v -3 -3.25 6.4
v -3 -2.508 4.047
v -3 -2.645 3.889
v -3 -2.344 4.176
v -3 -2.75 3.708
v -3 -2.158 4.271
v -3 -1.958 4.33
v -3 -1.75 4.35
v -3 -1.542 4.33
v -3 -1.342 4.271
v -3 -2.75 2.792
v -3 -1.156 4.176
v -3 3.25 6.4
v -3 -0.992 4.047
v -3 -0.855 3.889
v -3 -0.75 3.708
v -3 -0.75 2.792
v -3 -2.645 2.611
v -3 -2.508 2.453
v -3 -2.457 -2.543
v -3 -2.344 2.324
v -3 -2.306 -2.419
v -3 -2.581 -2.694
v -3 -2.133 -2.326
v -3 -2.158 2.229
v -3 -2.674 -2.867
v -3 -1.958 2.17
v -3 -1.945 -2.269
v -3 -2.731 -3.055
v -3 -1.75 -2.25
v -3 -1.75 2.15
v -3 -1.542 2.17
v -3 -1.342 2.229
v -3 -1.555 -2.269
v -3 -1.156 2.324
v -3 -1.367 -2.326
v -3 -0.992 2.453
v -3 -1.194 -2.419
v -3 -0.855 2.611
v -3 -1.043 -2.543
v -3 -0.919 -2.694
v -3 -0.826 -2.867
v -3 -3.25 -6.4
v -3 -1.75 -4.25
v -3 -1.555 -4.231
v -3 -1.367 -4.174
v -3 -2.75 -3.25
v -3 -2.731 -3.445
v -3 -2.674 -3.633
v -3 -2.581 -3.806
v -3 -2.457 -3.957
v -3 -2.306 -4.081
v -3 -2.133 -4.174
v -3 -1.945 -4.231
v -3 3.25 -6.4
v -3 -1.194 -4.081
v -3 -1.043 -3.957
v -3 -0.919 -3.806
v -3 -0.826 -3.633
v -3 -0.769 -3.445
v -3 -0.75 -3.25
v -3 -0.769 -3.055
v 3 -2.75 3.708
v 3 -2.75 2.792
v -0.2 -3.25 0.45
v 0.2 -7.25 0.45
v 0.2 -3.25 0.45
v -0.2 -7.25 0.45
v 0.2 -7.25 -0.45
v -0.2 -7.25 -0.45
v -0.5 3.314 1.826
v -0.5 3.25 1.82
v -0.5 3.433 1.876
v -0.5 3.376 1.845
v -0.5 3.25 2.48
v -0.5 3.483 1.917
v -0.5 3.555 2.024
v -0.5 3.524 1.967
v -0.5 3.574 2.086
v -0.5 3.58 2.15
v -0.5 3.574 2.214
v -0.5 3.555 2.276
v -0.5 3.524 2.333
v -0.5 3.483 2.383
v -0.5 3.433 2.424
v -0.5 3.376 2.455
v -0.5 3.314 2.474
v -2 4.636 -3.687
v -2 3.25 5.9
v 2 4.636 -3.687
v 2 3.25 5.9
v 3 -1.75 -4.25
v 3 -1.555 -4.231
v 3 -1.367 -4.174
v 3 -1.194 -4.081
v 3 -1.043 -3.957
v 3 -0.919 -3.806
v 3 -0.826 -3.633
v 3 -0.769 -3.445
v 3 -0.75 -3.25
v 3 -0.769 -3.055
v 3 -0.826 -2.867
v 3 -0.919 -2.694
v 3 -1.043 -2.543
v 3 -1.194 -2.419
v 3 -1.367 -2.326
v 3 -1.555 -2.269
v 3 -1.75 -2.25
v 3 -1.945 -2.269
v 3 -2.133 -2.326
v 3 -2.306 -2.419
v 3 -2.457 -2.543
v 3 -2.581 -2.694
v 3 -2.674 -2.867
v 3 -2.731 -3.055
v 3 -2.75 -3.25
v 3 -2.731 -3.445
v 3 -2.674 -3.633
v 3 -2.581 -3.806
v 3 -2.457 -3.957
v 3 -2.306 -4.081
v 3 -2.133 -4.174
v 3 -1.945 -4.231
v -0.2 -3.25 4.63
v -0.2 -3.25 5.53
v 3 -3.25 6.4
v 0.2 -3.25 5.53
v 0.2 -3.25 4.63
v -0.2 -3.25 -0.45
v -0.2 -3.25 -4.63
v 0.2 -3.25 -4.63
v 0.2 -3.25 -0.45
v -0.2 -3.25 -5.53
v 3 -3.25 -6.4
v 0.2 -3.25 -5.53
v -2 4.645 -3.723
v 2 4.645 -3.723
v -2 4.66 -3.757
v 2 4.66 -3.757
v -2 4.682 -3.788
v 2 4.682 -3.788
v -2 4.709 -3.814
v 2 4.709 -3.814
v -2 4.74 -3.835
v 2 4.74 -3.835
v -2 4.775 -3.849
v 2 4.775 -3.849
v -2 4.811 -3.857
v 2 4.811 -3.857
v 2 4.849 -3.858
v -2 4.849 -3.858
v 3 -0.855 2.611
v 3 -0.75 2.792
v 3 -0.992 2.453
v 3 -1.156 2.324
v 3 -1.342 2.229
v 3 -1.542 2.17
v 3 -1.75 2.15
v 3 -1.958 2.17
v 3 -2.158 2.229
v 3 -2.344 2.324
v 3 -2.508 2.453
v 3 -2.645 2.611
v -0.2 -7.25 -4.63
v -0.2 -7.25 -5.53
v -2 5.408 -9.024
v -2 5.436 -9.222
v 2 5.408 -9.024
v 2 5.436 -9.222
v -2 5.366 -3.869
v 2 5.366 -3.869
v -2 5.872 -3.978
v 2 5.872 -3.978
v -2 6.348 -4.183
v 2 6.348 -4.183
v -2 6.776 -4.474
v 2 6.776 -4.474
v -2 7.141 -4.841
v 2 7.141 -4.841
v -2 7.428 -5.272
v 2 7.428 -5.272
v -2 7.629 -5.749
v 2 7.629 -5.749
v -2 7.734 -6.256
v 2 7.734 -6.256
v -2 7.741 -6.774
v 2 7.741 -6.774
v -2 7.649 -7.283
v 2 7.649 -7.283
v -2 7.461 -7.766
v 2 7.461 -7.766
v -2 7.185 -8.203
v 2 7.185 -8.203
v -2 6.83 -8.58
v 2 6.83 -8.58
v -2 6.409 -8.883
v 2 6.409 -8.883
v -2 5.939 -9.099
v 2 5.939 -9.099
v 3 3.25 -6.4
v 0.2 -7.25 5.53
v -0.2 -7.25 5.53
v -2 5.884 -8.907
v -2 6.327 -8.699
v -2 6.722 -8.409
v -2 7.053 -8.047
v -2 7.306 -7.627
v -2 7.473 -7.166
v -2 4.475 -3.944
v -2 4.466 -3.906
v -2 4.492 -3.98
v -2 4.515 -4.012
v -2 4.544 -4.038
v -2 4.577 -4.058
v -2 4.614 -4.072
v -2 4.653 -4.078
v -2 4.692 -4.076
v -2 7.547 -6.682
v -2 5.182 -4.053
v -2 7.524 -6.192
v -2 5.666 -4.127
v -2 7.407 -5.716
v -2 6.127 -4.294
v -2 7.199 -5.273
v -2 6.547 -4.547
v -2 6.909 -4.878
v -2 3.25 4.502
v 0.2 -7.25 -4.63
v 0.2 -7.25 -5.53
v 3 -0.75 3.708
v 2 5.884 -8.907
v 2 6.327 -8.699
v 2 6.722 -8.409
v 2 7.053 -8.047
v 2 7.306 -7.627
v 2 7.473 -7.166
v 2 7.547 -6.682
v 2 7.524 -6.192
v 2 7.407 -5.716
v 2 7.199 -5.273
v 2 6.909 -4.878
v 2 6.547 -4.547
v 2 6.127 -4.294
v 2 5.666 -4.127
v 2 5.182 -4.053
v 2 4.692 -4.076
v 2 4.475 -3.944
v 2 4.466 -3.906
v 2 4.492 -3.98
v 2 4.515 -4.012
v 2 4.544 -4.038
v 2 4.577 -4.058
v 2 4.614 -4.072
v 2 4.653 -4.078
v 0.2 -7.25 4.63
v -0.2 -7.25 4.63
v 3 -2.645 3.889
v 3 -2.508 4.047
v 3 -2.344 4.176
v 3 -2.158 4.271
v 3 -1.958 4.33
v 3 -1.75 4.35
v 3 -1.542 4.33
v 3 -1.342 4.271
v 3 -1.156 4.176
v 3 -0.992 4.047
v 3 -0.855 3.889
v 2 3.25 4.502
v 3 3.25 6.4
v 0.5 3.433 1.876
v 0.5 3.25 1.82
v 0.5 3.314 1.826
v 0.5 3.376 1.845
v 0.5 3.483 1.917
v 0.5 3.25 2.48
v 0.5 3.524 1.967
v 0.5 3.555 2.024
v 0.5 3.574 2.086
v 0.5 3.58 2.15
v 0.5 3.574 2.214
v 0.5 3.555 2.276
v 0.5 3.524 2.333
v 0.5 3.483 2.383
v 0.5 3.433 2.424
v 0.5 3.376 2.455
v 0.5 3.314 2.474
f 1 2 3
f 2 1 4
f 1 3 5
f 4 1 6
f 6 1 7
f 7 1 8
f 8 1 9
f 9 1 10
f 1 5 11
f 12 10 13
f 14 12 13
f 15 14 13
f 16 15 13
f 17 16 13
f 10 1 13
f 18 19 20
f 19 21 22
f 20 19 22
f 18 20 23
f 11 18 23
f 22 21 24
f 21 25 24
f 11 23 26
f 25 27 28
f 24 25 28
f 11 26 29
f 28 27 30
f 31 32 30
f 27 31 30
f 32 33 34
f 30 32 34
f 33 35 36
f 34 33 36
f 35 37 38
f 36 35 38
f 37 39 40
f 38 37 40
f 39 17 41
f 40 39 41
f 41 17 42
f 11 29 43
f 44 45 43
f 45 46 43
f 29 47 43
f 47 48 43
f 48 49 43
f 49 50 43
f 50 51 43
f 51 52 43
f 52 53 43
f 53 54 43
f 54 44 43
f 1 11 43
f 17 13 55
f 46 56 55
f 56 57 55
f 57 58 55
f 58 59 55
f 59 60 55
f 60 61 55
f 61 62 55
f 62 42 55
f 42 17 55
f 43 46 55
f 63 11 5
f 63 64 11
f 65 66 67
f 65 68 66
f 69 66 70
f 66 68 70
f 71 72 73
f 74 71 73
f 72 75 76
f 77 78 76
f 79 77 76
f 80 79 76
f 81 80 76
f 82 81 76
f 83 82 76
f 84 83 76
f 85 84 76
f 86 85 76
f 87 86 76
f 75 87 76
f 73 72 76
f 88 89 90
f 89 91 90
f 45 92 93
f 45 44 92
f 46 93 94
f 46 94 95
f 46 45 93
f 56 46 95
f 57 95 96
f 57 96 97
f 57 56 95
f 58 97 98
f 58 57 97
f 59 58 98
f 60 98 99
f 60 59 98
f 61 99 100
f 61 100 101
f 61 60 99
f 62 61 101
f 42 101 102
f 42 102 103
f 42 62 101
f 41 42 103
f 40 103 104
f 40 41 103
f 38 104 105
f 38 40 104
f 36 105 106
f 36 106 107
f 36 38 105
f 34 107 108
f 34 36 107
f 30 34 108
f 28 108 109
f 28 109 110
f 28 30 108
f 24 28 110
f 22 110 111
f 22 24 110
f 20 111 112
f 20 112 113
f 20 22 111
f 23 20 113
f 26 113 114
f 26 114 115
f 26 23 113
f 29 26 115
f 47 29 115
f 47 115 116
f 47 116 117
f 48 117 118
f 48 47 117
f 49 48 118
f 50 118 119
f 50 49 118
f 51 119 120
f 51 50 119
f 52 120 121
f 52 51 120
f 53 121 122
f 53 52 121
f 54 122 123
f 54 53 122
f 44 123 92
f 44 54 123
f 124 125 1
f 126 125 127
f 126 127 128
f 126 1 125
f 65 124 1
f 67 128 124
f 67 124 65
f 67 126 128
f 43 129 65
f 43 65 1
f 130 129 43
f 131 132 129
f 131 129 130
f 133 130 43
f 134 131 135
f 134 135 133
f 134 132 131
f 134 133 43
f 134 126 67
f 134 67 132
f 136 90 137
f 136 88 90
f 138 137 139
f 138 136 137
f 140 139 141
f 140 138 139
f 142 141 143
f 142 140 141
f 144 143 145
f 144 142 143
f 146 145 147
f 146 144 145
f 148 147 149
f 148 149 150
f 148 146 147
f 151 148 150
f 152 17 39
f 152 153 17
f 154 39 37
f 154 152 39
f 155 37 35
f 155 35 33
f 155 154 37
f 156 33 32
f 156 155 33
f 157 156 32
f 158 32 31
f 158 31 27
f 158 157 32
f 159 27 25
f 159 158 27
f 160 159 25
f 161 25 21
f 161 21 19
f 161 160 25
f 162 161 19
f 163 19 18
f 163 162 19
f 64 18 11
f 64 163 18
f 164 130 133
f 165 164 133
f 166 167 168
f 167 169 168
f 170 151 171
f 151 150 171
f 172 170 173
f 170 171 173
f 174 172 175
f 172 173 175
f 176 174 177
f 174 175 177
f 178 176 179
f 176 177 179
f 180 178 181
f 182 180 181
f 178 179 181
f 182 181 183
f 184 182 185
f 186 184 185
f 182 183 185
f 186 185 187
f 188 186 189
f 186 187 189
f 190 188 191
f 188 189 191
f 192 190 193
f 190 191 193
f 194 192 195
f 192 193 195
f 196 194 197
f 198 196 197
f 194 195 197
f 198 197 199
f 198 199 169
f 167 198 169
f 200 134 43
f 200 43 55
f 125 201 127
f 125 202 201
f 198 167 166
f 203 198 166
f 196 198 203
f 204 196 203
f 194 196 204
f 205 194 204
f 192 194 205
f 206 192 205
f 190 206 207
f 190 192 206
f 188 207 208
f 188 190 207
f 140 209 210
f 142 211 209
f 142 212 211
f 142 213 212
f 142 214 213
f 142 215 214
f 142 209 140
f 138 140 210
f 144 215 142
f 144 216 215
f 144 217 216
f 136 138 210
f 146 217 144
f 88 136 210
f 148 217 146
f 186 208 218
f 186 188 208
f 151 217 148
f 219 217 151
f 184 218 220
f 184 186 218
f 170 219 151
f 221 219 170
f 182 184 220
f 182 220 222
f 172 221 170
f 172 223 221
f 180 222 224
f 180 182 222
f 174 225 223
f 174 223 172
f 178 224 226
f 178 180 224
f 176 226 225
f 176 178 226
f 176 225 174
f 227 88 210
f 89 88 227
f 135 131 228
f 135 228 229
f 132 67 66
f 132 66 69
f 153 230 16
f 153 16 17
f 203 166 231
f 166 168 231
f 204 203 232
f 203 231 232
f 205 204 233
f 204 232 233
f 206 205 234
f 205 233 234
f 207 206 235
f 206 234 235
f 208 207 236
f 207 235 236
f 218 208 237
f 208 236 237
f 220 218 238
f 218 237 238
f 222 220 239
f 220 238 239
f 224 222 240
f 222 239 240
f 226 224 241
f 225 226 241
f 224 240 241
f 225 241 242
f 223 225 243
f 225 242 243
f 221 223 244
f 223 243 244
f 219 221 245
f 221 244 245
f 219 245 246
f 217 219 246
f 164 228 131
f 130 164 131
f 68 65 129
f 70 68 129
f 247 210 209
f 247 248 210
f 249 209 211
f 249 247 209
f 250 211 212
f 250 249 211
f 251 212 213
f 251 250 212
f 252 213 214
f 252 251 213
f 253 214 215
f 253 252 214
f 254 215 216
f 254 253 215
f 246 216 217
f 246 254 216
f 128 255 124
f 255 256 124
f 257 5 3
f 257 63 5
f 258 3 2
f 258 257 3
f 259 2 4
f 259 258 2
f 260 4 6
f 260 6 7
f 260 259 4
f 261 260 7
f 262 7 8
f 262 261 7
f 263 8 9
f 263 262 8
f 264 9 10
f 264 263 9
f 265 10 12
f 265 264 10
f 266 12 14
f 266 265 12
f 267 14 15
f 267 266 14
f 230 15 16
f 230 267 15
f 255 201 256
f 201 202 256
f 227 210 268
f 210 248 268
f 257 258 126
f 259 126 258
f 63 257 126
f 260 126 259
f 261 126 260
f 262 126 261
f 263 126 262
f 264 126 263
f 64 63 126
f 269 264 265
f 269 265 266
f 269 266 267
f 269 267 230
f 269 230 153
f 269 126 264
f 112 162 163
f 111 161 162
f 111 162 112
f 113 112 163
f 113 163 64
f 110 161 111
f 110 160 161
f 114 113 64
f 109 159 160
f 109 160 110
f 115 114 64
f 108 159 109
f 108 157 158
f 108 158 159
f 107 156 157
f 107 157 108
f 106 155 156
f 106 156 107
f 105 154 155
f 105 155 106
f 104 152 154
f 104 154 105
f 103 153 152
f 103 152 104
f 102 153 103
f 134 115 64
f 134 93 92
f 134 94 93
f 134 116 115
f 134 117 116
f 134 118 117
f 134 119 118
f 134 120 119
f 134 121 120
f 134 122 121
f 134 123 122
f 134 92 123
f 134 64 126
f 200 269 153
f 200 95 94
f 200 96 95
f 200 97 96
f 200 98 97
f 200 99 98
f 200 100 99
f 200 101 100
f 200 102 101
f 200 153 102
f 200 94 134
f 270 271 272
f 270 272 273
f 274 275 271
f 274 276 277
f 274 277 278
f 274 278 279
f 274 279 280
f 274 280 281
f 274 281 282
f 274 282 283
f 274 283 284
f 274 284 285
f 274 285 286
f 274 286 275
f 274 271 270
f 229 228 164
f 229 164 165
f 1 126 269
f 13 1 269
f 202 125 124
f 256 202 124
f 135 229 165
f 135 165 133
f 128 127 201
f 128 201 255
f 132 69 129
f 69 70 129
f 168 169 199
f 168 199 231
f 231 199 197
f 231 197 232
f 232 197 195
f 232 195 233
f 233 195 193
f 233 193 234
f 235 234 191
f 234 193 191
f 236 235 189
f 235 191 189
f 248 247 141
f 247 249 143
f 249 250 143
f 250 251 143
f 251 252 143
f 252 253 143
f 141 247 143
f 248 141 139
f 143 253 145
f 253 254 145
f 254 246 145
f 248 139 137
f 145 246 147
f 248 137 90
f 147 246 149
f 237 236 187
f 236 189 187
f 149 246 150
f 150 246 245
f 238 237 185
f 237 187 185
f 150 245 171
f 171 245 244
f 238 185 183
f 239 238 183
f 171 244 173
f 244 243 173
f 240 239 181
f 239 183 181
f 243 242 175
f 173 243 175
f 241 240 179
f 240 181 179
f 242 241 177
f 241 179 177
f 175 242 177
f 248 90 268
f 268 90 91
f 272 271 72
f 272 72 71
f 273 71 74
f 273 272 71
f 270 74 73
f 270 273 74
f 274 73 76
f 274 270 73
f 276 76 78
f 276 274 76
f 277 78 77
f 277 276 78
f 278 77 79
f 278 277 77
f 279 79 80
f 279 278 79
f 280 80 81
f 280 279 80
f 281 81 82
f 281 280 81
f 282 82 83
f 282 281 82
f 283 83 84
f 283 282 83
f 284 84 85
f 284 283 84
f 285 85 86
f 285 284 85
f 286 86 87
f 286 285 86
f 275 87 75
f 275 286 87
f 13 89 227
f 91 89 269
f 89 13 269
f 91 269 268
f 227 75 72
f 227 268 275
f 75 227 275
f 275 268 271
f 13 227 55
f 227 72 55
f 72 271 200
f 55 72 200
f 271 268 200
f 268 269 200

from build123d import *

# Parameters (mm, degrees)
SKETCH1_W           = 12.8
SKETCH1_H           = 6.5
SKETCH1_R           = 1
BOSS_EXTRUDE1_DEPTH = 3
SKETCH3_W           = 0.9
SKETCH3_H           = 4
BOSS_EXTRUDE2_DEPTH = 0.2
BOSS_EXTRUDE3_DEPTH = 2
FILLET1_R           = 0.2
BOSS_EXTRUDE5_DEPTH = 0.5


with BuildPart() as part:
    # Sketch1 → Boss-Extrude1 (new body, symmetric)
    with BuildSketch(Plane(origin=(0, 0, 0), x_dir=(0, 0, -1), z_dir=(1, 0, 0))):
        Rectangle(SKETCH1_W, SKETCH1_H)
        with Locations((3.25, -1.75)):
            Circle(SKETCH1_R, mode=Mode.SUBTRACT)
        with BuildLine():
            Line((-3.708257569, -0.75), (-2.791742431, -0.75))
            ThreePointArc((-2.791742431, -0.75), (-2.15, -1.75), (-2.791742431, -2.75))
            Line((-2.791742431, -2.75), (-3.708257569, -2.75))
            ThreePointArc((-3.708257569, -2.75), (-4.35, -1.75), (-3.708257569, -0.75))
        make_face(mode=Mode.SUBTRACT)
    extrude(amount=BOSS_EXTRUDE1_DEPTH, both=True)

    # Sketch3 → Boss-Extrude2 (add, symmetric)
    with BuildSketch(Plane(origin=(0, 0, 0), x_dir=(0, 0, -1), z_dir=(1, 0, 0))):
        with Locations((-5.08, -5.25)):
            Rectangle(SKETCH3_W, SKETCH3_H)
        with Locations((0, -5.25)):
            Rectangle(SKETCH3_W, SKETCH3_H)
        with Locations((5.08, -5.25)):
            Rectangle(SKETCH3_W, SKETCH3_H)
    extrude(amount=BOSS_EXTRUDE2_DEPTH, both=True)

    # Sketch4 → Boss-Extrude3 (add, symmetric)
    with BuildSketch(Plane(origin=(0, 0, 0), x_dir=(0, 0, -1), z_dir=(1, 0, 0))):
        with BuildLine():
            Line((-5.9, 3.25), (3.877784075, 4.663655529))
            ThreePointArc((3.877784075, 4.663655529), (6.163655529, 7.722215925), (9.222215925, 5.436344471))
            Line((9.222215925, 5.436344471), (9.024274005, 5.407726362))
            ThreePointArc((9.024274005, 5.407726362), (6.093510034, 7.507970079), (4.11227449, 4.495478279))
            Line((4.11227449, 4.495478279), (-4.502283608, 3.25))
            Line((-4.502283608, 3.25), (-5.9, 3.25))
        make_face()
    extrude(amount=BOSS_EXTRUDE3_DEPTH, both=True)

    # Fillet1
    fillet1_edges = [part.edges().sort_by_distance(p)[0] for p in [
        (0, 4.495478279, -4.11227449),
        (0, 4.663655529, -3.877784075),
    ]]
    fillet(fillet1_edges, radius=FILLET1_R)

    # Sketch5 → Boss-Extrude5 (add, symmetric)
    with BuildSketch(Plane(origin=(0, 0, 0), x_dir=(0, 0, -1), z_dir=(1, 0, 0))):
        with BuildLine():
            Line((-2.48, 3.25), (-1.82, 3.25))
            ThreePointArc((-1.82, 3.25), (-2.15, 3.58), (-2.48, 3.25))
        make_face()
    extrude(amount=BOSS_EXTRUDE5_DEPTH, both=True)


solid = part.part
